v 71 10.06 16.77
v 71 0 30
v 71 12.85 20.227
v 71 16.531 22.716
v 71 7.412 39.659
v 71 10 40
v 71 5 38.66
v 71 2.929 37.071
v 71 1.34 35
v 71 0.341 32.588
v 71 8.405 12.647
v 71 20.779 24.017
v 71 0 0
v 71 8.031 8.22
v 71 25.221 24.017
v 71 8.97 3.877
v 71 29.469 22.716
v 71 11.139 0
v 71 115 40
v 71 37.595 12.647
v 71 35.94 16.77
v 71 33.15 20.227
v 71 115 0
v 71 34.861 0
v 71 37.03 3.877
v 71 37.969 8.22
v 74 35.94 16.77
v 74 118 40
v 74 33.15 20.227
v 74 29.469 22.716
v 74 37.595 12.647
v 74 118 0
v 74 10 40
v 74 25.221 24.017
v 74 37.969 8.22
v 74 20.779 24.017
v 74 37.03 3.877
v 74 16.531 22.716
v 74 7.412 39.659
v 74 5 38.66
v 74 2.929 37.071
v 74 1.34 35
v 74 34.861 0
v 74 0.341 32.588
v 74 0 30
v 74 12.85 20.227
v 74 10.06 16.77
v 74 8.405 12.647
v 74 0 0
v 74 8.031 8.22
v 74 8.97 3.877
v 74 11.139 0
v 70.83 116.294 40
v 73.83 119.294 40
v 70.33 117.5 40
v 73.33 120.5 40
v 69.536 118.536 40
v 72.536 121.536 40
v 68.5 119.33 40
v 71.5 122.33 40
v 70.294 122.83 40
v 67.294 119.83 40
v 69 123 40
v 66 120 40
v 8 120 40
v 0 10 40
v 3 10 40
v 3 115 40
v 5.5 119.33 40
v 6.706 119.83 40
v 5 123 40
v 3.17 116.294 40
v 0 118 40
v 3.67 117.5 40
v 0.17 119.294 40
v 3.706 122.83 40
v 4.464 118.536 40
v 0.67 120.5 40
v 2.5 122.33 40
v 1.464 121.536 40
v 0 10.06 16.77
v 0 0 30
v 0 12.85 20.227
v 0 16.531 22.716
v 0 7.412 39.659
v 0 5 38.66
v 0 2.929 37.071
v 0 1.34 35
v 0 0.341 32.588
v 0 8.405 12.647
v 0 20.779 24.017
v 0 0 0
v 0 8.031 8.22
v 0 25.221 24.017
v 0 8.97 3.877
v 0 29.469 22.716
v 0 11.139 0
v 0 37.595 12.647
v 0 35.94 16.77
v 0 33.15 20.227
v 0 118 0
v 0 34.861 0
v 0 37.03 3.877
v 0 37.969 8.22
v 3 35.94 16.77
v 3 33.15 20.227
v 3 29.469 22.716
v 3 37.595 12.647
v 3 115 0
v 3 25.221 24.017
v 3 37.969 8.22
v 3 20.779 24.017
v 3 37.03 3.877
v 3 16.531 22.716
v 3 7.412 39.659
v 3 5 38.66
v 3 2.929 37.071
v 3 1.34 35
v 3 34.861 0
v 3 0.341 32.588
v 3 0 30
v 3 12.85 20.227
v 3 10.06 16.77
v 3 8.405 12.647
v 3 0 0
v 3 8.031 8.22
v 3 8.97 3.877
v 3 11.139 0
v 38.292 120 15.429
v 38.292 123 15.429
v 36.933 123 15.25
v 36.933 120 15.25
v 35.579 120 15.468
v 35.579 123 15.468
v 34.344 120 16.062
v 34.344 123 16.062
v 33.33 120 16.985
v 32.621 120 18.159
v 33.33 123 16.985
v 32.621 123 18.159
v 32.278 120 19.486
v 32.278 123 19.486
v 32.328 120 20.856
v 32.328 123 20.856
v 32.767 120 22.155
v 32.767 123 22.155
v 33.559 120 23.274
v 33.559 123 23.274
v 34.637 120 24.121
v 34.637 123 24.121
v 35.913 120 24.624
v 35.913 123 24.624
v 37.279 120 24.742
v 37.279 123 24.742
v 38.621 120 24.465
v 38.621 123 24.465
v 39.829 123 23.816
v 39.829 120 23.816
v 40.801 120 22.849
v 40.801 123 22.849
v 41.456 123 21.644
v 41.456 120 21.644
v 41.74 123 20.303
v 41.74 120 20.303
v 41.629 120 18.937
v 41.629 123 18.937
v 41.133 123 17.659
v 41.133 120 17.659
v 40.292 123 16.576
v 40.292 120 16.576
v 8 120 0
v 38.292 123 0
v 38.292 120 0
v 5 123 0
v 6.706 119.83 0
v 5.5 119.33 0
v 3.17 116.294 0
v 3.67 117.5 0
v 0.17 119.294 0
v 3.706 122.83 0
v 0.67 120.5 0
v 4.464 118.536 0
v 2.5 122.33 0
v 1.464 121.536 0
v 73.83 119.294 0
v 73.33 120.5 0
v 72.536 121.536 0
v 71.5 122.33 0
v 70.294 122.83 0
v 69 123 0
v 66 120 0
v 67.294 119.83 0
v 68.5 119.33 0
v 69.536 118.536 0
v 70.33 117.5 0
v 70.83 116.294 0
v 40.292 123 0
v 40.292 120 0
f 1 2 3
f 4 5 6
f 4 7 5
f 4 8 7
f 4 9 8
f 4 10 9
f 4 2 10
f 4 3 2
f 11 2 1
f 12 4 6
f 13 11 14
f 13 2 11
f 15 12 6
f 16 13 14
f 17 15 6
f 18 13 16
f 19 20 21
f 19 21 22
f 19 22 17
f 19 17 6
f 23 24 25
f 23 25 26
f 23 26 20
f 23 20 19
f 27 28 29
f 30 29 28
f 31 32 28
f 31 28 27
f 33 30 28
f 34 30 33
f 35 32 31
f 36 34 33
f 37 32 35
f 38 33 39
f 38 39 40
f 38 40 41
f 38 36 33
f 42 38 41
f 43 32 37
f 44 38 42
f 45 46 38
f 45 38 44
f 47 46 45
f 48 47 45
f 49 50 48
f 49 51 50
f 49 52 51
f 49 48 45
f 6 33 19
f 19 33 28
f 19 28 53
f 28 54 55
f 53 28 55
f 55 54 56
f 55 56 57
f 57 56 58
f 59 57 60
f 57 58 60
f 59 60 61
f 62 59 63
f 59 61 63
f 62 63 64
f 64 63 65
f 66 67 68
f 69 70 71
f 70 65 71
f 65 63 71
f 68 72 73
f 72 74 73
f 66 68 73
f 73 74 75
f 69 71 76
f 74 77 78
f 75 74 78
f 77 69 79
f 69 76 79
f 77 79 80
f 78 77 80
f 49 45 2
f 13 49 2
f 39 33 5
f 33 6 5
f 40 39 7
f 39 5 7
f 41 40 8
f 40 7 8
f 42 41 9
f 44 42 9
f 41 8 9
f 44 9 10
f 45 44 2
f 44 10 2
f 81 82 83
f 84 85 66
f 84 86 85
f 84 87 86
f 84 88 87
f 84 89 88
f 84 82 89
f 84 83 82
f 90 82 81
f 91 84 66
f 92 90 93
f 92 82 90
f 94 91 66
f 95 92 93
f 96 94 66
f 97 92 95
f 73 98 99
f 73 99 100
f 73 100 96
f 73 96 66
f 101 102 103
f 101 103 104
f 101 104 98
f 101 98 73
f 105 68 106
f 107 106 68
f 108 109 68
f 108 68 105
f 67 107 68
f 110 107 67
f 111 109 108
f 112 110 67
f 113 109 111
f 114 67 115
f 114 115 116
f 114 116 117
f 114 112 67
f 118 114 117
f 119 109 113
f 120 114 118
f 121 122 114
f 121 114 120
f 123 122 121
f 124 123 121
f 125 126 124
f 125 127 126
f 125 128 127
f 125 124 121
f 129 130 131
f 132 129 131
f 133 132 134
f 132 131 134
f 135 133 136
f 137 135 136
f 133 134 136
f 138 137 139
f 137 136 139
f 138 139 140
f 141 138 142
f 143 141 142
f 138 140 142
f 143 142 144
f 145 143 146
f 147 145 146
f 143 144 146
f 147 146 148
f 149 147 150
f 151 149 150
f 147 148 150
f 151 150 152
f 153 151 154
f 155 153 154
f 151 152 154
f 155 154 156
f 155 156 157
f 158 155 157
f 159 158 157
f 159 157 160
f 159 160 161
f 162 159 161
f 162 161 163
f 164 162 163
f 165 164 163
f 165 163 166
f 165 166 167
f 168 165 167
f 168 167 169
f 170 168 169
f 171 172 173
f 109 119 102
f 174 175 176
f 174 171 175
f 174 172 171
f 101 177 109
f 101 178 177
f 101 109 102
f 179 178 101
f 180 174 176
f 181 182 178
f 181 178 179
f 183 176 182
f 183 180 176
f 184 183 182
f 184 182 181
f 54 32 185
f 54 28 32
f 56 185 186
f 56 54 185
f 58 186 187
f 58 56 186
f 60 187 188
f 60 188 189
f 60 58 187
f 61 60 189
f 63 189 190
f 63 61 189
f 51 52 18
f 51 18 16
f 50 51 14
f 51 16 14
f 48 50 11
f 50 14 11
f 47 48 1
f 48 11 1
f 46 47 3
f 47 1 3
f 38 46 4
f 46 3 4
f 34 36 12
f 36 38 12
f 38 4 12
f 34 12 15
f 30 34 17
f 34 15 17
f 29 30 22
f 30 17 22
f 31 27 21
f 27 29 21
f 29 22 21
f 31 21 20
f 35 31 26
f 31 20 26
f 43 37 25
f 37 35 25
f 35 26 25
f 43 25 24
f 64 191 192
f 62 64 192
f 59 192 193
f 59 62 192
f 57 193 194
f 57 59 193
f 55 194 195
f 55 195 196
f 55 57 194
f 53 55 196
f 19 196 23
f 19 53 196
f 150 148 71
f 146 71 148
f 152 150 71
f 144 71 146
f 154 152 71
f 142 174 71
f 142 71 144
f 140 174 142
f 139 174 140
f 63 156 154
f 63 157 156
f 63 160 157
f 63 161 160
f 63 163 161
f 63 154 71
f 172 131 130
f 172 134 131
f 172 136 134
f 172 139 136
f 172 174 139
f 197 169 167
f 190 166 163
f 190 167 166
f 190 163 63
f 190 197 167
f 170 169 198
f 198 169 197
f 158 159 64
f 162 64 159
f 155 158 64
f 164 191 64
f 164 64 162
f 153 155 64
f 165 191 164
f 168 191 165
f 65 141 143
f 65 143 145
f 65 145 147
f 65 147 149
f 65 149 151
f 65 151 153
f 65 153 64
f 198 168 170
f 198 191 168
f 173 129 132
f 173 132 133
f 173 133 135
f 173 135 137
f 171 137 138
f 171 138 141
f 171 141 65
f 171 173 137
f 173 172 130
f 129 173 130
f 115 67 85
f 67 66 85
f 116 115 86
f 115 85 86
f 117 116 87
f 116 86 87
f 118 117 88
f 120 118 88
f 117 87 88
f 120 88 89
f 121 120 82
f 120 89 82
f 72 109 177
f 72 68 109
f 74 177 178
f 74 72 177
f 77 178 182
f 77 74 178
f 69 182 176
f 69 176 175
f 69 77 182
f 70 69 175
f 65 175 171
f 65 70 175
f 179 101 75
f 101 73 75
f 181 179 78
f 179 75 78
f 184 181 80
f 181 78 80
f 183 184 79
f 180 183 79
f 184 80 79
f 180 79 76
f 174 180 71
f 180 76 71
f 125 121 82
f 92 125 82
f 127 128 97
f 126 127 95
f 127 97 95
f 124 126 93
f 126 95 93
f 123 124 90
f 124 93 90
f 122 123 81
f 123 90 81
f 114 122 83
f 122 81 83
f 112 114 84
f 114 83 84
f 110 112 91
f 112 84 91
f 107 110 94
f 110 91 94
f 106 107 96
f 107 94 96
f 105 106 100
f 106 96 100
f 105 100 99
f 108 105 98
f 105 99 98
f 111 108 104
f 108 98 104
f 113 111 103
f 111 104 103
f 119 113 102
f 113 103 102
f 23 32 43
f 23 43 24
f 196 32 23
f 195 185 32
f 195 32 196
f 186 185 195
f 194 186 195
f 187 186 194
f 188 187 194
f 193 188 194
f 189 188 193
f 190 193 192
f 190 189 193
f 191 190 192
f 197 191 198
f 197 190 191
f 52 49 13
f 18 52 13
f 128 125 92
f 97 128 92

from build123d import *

# Parameters (mm, degrees)
PAD_DEPTH       = 40
SKETCH001_R     = 15
POCKET_DEPTH    = 74.001
FILLET_R        = 5
FILLET001_R     = 10
POCKET001_DEPTH = 5


with BuildPart() as part:
    # Sketch → Pad (new body)
    with BuildSketch(Plane.XY):
        Polygon((0, 0), (0, 123), (74, 123), (74, 0), (71, 0), (71, 120), (3, 120), (3, 0), align=None)
    extrude(amount=PAD_DEPTH)

    # Sketch001 → Pocket (cut, through all)
    with BuildSketch(Plane(origin=(0, 0, 0), x_dir=(0, -1, 0), z_dir=(-1, 0, 0))):
        with Locations((-23, 9.182545)):
            Circle(SKETCH001_R)
    extrude(amount=-POCKET_DEPTH, mode=Mode.SUBTRACT)

    # Fillet
    fillet_edges = [part.edges().sort_by_distance(p)[0] for p in [
        (0, 123, 20),
        (74, 123, 20),
        (71, 120, 20),
        (3, 120, 20),
    ]]
    fillet(fillet_edges, radius=FILLET_R)

    # Fillet001
    fillet001_edges = [part.edges().sort_by_distance(p)[0] for p in [
        (72.5, 0, 40),
        (1.5, 0, 40),
    ]]
    fillet(fillet001_edges, radius=FILLET001_R)

    # Sketch002 → Pocket001 (cut)
    with BuildSketch(Plane(origin=(0, 123, 0), x_dir=(-1, 0, 0), z_dir=(0, 1, 0))):
        with BuildLine():
            ThreePointArc((-38.291944, 15.429072), (-34.637435, 24.120775), (-40.291944, 16.575733))
            Line((-40.291944, 16.575733), (-40.291944, 0))
            Line((-40.291944, 0), (-38.291944, 0))
            Line((-38.291944, 0), (-38.291944, 15.429072))
        make_face()
    extrude(amount=-POCKET001_DEPTH, mode=Mode.SUBTRACT)


solid = part.part
